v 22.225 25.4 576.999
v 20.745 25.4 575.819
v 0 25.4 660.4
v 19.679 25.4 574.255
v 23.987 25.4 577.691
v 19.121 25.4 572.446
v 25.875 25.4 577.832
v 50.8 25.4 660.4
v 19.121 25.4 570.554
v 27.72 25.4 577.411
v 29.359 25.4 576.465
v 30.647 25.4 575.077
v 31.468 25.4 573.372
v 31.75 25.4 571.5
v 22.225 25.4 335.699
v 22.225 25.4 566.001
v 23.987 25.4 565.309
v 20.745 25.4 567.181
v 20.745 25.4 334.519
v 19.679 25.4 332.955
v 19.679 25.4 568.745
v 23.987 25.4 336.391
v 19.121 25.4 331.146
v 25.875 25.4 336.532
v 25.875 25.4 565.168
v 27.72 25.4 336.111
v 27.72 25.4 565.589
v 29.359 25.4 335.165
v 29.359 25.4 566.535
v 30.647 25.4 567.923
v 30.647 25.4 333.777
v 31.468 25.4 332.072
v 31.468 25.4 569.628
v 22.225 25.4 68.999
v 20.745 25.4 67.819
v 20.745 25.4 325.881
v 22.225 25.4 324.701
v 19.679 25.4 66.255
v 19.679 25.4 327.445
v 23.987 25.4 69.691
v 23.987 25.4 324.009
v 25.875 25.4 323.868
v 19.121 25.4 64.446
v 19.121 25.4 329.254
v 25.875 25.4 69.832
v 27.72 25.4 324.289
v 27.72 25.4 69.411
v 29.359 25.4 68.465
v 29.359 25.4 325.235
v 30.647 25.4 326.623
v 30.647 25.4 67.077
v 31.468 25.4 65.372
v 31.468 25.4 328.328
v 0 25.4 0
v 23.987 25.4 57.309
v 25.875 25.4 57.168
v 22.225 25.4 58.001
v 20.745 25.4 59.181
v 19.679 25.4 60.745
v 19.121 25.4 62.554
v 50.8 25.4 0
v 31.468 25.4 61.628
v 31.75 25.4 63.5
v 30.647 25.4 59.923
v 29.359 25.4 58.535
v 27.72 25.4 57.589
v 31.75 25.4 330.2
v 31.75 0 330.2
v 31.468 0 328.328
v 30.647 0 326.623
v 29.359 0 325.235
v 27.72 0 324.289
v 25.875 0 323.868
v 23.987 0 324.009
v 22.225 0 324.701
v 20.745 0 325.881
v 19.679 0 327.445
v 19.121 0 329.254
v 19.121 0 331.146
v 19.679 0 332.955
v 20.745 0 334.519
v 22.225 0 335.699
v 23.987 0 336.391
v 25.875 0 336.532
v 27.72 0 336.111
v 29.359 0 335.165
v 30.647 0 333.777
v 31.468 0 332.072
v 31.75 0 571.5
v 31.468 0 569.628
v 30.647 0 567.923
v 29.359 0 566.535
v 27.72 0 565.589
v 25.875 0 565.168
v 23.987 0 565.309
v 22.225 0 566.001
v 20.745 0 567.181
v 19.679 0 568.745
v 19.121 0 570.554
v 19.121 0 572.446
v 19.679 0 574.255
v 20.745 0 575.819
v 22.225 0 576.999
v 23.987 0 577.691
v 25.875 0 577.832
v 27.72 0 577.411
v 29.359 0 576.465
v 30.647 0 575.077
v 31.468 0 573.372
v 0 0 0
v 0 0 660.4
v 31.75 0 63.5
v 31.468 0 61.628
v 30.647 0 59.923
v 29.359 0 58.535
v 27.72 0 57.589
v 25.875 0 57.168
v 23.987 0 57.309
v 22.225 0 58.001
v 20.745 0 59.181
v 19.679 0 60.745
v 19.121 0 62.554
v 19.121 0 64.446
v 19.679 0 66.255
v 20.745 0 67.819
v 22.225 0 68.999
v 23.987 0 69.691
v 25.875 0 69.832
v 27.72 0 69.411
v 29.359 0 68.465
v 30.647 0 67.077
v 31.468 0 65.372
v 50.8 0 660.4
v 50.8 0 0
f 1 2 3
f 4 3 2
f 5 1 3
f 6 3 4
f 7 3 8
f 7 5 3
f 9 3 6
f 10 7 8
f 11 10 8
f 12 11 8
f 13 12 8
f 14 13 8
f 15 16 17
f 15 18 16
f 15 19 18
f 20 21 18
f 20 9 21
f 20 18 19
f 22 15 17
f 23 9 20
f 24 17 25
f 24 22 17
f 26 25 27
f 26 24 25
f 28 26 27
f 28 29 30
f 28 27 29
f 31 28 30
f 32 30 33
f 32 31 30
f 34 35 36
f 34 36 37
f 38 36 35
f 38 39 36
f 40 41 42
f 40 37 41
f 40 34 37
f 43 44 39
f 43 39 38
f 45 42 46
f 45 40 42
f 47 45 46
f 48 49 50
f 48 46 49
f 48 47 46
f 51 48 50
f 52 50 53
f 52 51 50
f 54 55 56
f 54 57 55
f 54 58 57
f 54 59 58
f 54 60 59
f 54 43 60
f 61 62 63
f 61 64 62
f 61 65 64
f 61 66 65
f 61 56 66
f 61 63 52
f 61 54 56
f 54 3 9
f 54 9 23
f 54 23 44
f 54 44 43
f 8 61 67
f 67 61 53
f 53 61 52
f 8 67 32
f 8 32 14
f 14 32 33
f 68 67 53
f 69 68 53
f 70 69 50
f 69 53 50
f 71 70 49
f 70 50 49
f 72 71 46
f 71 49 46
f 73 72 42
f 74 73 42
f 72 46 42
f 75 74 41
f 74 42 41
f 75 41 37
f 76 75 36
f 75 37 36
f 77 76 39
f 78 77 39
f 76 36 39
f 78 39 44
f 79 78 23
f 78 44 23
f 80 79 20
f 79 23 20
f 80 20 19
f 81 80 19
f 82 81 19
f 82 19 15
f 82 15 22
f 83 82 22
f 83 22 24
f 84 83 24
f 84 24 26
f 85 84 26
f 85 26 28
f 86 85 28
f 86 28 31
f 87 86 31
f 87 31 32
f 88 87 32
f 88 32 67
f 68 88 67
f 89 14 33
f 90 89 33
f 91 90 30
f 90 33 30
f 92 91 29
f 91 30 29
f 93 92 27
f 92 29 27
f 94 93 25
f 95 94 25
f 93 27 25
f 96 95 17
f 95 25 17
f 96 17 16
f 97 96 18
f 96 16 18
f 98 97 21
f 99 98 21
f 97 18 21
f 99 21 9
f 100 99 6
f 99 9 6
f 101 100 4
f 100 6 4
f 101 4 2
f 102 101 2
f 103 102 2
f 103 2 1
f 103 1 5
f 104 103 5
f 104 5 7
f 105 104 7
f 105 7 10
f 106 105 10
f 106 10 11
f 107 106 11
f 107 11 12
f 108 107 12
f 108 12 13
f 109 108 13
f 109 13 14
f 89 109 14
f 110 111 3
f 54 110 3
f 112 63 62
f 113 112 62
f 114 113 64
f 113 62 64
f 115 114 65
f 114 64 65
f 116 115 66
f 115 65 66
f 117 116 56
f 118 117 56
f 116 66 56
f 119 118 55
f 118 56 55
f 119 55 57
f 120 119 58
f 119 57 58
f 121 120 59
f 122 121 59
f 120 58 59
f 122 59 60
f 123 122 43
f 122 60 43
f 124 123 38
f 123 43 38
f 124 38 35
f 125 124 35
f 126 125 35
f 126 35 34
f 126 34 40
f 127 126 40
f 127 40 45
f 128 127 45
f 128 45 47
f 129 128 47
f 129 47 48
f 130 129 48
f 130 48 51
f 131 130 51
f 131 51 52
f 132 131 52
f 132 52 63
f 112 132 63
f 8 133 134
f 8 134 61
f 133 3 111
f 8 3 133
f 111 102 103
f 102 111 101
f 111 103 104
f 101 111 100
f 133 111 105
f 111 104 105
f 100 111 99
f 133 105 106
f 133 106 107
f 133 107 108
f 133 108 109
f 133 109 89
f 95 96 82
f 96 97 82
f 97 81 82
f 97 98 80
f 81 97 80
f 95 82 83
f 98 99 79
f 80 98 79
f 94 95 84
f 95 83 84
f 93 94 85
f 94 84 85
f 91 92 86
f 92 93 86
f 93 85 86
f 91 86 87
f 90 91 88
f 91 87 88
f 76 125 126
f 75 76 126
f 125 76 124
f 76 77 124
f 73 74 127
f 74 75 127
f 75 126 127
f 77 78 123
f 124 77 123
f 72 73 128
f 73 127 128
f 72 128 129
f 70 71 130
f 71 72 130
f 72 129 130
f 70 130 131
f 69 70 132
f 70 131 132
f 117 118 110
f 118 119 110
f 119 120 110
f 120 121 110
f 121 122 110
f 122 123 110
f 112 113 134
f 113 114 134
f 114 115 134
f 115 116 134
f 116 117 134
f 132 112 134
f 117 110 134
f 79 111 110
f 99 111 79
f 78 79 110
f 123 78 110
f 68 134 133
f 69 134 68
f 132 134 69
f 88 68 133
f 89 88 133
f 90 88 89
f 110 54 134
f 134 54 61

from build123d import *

# Parameters (mm, degrees)
SKETCH1_W           = 50.8
SKETCH1_H           = 25.4
BOSS_EXTRUDE1_DEPTH = 660.4
SKETCH2_R           = 6.35
CUT_EXTRUDE1_DEPTH  = 254


with BuildPart() as part:
    # Sketch1 → Boss-Extrude1 (new body)
    with BuildSketch(Plane.XY):
        with Locations((25.4, 12.7)):
            Rectangle(SKETCH1_W, SKETCH1_H)
    extrude(amount=BOSS_EXTRUDE1_DEPTH)

    # Sketch2 → Cut-Extrude1 (cut)
    with BuildSketch(Plane(origin=(0, 25.4, 0), x_dir=(1, 0, 0), z_dir=(0, 1, 0))):
        with Locations((25.4, -63.5)):
            Circle(SKETCH2_R)
        with Locations((25.4, -571.5)):
            Circle(SKETCH2_R)
        with Locations((25.4, -330.2)):
            Circle(SKETCH2_R)
    extrude(amount=-CUT_EXTRUDE1_DEPTH, mode=Mode.SUBTRACT)


solid = part.part
